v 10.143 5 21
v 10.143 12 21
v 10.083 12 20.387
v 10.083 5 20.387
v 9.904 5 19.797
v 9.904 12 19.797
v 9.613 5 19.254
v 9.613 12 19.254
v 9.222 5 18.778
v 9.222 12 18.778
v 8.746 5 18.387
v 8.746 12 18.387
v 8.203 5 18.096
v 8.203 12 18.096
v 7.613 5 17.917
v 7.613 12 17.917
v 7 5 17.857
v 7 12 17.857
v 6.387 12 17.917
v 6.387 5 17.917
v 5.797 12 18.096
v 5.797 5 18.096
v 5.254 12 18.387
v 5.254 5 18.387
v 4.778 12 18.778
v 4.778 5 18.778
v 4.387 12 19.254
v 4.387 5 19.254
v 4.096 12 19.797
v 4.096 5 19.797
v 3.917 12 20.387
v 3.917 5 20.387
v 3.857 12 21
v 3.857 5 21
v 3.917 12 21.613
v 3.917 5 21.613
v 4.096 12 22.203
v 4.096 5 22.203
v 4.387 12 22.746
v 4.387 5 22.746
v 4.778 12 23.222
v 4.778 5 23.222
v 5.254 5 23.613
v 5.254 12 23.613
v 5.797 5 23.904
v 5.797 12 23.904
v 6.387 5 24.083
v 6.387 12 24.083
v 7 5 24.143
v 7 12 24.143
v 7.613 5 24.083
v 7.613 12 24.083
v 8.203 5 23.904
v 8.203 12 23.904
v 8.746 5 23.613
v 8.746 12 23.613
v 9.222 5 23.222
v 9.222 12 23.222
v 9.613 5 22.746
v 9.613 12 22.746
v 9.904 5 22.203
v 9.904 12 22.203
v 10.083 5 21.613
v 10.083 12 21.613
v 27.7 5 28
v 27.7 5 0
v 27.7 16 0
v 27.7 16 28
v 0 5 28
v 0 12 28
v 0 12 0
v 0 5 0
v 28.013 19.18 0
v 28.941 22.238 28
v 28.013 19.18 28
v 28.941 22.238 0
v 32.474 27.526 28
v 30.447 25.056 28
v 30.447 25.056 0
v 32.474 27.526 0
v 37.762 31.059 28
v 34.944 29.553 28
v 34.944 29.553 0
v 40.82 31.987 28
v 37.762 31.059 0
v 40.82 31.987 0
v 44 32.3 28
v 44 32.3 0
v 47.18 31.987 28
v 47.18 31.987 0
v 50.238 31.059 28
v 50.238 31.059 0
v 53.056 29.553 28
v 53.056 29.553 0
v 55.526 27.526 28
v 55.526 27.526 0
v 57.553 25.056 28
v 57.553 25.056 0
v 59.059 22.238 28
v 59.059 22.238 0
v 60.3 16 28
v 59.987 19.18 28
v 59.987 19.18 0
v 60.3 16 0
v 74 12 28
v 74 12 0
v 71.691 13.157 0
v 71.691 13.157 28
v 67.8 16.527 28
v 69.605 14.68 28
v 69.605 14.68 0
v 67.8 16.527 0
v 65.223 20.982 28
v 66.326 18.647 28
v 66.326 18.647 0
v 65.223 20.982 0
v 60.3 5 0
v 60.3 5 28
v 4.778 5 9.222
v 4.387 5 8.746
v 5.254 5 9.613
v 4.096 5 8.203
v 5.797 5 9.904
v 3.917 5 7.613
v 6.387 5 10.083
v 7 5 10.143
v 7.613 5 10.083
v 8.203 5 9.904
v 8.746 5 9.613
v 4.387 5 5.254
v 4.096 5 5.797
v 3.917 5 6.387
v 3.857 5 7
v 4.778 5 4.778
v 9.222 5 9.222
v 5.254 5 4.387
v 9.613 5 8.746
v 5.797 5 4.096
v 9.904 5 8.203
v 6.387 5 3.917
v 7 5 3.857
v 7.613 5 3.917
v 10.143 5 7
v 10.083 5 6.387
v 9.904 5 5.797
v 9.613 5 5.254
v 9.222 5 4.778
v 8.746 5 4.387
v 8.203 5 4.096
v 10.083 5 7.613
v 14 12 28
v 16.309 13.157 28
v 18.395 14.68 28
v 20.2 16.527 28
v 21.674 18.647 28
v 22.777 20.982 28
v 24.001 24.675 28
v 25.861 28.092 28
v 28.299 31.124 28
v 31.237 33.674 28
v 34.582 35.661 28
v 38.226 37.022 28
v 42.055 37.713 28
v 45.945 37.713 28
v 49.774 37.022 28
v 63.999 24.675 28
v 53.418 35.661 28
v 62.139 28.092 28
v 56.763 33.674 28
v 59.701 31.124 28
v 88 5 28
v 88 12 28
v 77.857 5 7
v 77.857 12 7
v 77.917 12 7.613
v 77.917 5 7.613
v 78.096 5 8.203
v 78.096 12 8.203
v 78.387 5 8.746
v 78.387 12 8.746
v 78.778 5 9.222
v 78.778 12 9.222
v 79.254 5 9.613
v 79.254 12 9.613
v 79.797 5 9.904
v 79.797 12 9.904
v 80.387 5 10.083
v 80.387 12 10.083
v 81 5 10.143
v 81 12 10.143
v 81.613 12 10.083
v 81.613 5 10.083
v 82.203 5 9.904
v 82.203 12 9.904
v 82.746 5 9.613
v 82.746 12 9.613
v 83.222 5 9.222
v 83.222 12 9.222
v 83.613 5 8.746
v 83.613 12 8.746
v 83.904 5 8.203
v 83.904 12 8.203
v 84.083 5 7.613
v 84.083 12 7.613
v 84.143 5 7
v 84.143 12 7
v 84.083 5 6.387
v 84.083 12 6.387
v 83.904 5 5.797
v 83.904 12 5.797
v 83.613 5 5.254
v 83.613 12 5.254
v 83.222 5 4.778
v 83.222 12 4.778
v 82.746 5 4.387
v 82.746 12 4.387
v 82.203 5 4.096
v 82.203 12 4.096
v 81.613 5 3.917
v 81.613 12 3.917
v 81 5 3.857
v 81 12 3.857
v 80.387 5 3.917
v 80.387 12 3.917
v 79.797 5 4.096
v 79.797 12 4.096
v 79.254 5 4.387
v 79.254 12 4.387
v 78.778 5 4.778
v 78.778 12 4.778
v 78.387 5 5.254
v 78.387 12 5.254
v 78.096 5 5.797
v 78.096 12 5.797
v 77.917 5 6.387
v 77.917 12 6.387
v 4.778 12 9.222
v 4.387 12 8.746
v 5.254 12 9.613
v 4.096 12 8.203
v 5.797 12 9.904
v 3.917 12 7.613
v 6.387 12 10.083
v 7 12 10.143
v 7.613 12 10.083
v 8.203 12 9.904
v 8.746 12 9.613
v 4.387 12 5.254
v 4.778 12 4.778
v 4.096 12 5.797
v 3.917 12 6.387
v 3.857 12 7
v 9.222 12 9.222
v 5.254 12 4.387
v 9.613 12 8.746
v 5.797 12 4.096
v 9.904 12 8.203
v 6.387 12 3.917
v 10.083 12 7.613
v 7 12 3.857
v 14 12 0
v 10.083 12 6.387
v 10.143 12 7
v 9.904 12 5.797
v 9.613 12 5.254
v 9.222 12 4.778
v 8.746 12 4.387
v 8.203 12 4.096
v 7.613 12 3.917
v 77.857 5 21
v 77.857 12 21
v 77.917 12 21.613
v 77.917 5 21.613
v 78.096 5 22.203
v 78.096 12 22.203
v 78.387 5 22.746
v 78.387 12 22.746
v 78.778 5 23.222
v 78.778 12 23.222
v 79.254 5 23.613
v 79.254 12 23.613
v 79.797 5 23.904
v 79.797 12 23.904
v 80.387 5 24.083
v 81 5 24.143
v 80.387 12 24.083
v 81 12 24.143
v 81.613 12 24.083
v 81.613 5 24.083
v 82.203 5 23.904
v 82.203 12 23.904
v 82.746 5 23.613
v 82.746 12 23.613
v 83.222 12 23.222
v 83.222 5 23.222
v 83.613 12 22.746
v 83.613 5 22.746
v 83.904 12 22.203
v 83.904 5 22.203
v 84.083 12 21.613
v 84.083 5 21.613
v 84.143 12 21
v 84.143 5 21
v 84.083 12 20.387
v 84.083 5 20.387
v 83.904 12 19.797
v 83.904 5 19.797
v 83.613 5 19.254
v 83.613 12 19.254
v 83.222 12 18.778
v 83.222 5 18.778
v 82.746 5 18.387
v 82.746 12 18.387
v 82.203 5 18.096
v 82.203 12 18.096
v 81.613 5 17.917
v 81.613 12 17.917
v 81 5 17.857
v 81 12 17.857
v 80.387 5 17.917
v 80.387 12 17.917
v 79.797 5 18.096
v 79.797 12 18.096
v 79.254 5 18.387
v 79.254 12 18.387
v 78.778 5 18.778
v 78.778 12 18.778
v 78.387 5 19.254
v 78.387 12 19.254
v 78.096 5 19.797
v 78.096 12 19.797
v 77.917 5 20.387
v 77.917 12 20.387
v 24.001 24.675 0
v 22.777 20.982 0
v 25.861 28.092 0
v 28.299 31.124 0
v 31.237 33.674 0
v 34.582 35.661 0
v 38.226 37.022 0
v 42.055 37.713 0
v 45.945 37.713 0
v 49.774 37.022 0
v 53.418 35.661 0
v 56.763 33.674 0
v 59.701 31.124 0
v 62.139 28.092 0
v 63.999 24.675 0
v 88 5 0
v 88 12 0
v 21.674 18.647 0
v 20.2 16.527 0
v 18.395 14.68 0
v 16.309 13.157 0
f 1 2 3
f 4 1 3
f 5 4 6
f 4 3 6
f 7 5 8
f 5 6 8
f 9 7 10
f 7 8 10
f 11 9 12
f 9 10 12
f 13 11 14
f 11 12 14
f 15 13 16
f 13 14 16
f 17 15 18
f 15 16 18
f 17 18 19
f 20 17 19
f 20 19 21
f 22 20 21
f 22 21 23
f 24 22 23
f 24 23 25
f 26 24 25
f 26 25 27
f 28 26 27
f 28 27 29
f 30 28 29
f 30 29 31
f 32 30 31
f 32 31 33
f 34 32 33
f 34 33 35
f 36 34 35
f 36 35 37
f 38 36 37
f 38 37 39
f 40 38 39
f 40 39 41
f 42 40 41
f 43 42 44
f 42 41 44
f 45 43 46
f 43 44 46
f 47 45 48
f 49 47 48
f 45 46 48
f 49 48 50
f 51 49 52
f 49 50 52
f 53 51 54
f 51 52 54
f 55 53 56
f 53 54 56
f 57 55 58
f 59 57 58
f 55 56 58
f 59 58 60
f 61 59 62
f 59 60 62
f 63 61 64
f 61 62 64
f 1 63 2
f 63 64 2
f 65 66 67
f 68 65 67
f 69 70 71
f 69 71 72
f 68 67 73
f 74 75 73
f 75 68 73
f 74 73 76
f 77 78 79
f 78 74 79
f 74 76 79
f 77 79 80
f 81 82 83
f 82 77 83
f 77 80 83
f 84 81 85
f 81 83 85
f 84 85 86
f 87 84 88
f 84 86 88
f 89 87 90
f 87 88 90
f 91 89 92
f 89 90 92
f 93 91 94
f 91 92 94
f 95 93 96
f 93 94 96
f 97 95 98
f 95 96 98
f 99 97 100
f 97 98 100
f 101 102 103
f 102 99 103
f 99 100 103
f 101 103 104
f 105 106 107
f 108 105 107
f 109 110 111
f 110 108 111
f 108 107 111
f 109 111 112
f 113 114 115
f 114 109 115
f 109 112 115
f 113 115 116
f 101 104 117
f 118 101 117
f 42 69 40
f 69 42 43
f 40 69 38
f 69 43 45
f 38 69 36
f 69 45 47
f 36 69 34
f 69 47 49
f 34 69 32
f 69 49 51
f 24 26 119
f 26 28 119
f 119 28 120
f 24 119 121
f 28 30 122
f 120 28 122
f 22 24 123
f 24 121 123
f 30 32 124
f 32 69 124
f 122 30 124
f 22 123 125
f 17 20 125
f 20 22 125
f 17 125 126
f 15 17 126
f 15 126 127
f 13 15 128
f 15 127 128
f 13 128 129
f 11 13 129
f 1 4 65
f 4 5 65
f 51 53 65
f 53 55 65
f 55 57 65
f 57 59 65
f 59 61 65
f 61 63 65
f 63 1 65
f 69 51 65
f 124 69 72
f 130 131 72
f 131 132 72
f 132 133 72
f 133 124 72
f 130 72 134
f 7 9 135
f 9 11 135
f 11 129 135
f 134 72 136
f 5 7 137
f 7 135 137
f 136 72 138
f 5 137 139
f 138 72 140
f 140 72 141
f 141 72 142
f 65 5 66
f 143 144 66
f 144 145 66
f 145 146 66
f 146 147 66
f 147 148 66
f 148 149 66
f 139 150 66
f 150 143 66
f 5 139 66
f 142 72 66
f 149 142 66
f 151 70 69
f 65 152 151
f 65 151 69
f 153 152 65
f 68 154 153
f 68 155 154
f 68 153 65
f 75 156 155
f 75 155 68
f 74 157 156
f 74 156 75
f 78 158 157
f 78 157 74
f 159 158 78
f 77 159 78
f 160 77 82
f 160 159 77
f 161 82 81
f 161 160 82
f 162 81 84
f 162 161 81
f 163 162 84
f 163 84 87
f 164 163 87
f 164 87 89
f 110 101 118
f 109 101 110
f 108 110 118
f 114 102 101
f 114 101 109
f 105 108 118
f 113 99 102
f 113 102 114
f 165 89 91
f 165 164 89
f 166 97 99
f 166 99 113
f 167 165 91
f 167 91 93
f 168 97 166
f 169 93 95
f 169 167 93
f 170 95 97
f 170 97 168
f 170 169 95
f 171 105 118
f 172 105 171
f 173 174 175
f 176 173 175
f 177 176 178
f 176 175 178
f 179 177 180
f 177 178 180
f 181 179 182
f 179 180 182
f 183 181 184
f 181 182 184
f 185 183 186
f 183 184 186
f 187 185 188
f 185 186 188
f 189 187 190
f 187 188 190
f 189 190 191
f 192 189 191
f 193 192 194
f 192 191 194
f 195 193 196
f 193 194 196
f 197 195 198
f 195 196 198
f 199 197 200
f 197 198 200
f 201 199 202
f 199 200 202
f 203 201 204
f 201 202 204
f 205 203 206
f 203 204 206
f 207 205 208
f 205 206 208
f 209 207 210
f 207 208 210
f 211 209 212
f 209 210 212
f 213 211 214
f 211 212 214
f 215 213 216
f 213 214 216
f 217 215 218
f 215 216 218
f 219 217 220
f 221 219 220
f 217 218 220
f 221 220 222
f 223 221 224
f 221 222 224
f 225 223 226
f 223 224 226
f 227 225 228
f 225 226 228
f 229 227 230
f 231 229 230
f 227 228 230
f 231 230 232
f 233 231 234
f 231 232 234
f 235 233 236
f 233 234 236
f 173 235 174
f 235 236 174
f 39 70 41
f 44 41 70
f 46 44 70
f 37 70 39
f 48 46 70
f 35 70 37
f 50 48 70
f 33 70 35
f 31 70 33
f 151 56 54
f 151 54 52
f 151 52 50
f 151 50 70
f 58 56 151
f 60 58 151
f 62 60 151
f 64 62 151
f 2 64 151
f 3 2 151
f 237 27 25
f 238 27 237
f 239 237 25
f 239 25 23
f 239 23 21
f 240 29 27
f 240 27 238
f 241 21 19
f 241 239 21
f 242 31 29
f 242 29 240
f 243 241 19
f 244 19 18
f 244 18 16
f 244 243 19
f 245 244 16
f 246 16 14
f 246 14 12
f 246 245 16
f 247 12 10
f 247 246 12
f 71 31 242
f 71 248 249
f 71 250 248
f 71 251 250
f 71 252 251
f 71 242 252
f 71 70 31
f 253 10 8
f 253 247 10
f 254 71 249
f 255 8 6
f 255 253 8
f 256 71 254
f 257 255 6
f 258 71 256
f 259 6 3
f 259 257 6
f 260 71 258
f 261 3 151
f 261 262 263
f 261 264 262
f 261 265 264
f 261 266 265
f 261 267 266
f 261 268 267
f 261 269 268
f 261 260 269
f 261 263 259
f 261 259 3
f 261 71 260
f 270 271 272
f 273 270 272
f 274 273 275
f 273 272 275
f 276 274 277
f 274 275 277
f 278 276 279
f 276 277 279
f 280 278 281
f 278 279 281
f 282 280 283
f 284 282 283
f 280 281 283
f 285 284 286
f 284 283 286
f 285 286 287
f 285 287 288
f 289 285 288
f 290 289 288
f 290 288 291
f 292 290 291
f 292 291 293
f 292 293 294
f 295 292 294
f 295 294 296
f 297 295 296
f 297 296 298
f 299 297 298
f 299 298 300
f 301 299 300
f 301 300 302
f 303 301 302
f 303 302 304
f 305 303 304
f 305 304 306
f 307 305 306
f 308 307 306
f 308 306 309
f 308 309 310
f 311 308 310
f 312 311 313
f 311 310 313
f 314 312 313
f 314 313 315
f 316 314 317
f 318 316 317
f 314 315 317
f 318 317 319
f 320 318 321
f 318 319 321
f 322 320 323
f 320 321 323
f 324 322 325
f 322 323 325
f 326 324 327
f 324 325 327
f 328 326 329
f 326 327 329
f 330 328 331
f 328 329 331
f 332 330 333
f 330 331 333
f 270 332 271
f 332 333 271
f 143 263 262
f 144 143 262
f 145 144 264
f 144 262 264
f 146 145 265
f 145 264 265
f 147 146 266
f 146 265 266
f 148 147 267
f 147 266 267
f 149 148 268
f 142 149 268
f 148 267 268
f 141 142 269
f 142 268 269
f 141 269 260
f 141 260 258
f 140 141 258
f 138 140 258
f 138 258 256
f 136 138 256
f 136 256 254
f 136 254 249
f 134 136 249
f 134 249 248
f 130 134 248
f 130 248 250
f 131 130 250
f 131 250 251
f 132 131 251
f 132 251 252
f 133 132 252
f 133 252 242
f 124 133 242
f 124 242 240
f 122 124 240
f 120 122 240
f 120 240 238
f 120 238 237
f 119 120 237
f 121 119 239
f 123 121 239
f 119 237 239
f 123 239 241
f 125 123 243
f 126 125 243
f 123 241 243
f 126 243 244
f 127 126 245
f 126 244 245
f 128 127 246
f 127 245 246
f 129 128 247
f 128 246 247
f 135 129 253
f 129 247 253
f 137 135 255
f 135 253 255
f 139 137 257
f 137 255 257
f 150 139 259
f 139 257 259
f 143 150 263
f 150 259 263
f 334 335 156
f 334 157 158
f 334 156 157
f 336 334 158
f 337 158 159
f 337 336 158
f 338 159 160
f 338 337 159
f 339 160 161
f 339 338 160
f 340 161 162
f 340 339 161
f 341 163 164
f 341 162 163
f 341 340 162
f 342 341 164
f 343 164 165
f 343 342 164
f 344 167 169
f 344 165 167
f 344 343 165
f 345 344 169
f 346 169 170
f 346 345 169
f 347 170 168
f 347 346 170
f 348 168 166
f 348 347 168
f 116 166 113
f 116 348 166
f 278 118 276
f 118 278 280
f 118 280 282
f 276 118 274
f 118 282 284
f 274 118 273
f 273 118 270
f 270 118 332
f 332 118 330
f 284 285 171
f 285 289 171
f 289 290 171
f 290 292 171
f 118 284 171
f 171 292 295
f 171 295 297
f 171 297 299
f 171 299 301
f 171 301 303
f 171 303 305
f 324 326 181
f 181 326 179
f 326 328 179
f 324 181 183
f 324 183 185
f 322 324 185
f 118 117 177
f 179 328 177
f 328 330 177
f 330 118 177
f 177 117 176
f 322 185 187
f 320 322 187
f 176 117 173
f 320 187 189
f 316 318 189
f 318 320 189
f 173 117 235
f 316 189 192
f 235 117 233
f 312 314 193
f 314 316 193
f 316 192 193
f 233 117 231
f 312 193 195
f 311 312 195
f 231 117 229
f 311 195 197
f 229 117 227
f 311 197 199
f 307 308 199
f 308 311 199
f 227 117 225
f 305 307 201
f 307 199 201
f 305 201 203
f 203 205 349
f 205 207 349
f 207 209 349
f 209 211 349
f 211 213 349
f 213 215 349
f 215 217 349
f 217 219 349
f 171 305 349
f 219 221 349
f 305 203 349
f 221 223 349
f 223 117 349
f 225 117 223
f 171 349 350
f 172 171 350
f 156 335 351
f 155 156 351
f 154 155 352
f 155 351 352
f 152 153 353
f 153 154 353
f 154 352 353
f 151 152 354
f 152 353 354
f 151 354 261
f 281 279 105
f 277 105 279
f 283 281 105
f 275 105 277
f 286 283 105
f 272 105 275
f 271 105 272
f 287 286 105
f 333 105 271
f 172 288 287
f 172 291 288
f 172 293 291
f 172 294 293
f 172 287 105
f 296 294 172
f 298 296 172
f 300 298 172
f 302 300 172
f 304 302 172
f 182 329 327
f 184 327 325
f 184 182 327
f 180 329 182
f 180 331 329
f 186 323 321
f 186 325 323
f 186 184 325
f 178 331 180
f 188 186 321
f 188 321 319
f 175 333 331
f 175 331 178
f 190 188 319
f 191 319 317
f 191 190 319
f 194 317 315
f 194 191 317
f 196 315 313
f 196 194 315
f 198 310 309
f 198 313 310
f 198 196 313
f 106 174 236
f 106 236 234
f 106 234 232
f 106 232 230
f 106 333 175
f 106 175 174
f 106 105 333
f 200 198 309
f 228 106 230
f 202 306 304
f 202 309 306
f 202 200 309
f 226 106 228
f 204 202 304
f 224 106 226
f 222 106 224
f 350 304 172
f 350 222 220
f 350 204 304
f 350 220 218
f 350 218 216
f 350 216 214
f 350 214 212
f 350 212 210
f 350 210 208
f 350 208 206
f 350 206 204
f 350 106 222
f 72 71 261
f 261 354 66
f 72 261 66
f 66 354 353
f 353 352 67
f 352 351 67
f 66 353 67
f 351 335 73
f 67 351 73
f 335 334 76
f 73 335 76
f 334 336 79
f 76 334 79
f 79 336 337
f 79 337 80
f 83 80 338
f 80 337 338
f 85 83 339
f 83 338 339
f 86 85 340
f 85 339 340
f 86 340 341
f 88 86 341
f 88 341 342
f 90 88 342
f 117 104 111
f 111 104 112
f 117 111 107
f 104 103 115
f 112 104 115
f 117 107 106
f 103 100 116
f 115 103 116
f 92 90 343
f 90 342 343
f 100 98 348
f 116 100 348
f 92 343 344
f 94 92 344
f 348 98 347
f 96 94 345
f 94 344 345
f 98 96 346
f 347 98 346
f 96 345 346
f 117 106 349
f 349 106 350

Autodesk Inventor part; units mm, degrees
ref_plane "YZ Plane" through (0, 0, 0) normal (1, 0, 0) x (0, 1, 0)
ref_plane "XZ Plane" through (0, 0, 0) normal (0, 1, 0) x (-1, 0, 0)
ref_plane "XY Plane" through (0, 0, 0) normal (0, 0, 1) x (1, 0, 0)
sketch "Sketch1" plane through (0, 0, 0) normal (0, 0, 1) x (1, 0, 0)
  line L0 (88, 5) -> (88, 7)
  line L1 (0, 7) -> (0, 5)
  line L2 (0, 0) -> (0, 32) construction
  line L3 (0, 32) -> (28, 32) construction
  line L4 (28, 32) -> (60, 32) construction
  line L5 (60, 32) -> (88, 32) construction
  line L6 (88, 32) -> (88, 0) construction
  line L7 (60, 63.7192) -> (60, -36.6397) construction
  line L8 (28, 67.21) -> (28, -43.6212) construction
  line L9 (44, 32) -> (44, 16) construction
  line L10 (27.7, 5) -> (27.7, 16)
  arc A0 (60.3, 16) -> (27.7, 16) centre (44, 16) ccw
  line L11 (60.3, 16) -> (60.3, 5)
  arc A1 (65.223, 20.9825) -> (22.777, 20.9825) centre (44, 16) ccw
  line L12 (22.2, 7) -> (13.2, 7)
  line L13 (22.2, 0) -> (22.2, 5)
  line L14 (22.2, 5) -> (0, 5)
  line L15 (0, 5) -> (0, 12)
  line L16 (88, 12) -> (88, 5)
  line L17 (22.2, 7) -> (13.2, 7)
  arc A2 (14, 12) -> (22.777, 20.9825) centre (8.2155, 26.4316) ccw
  arc A3 (65.223, 20.9825) -> (74, 12) centre (79.7845, 26.4316) ccw
  line L18 (60.3, 7) -> (60, 7)
  line L19 (28, 7) -> (27.7, 7)
  line L20 (22.2, 5) -> (28, 5)
  line L21 (60, 5) -> (88, 5)
  line L22 (27.7, 0) -> (28, 0)
  line L23 (60, 0) -> (60.3, 0)
  line L24 (0, 12) -> (14, 12)
  line L25 (27.7, 12) -> (28, 12)
  line L26 (22.2, 0) -> (22.2, 7)
  line L27 (60, 12) -> (60.3, 12)
  line L28 (74, 12) -> (88, 12)
  dimension "d0" = 88
  dimension "d1" = 7
  dimension "d2" = 32
  dimension "d3" = 28
  dimension "d4" = 32
  dimension "d5" = 28
  dimension "d6" = 16
  dimension "d8" = 5.5
  dimension "d9" = 9
  dimension "d10" = 5
  dimension "d11" = 7
  dimension "d12" = 9
extrude "Extrusion1" add sketch "Sketch1" along normal blind 28
sketch "Sketch2" plane through (0, 12, 0) normal (0, 1, 0) x (1, 0, 0)
  line L0 (14, 0) -> (0, 0) projected
  line L1 (14, 0) -> (14, -28) projected
  line L2 (0, 0) -> (14, -28) construction
  line L3 (14, 0) -> (0, -28) construction
  line L4 (7, 0) -> (7, -7) construction
  circle A0 centre (7, -7) radius 2.743
  dimension "d15" = 7
  dimension "d16" = 5.486
extrude "Extrusion2" cut sketch "Sketch2" against normal blind 28
ref_plane "Work Plane1" through (0, 0, 14) normal (0, 0, 1) x (1, 0, 0)
ref_plane "Work Plane2" through (44, 5, 0) normal (-1, 0, 0) x (0, 0, 1)
mirror "Mirror1" about plane through (0, 0, 14) normal (0, 0, 1) of "Extrusion2"
mirror "Mirror2" about plane through (44, 5, 0) normal (-1, 0, 0) of "Extrusion2", "Mirror1"
sketch "Sketch3" plane through (0, 12, 0) normal (0, 1, 0) x (1, 0, 0)
  circle A0 centre (7, -21) radius 2.743 projected
  circle A1 centre (7, -7) radius 2.743 projected
  line L0 (14, 0) -> (0, 0) projected
  line L1 (0, 0) -> (0, -28) projected
  line L2 (14, -28) -> (0, -28) projected
  line L3 (14, 0) -> (14, -28) projected
  circle A2 centre (7, -7) radius 3.143
  circle A3 centre (7, -7) radius 2.743
  dimension "d19" = 0.4
extrude "Extrusion3" cut sketch "Sketch3" against normal blind 10 contours A2
mirror "Mirror3" about plane through (0, 0, 14) normal (0, 0, 1) of "Extrusion3"
mirror "Mirror4" about plane through (44, 5, 0) normal (-1, 0, 0) of "Extrusion3", "Mirror3"
properties part number "Motor Mount"
